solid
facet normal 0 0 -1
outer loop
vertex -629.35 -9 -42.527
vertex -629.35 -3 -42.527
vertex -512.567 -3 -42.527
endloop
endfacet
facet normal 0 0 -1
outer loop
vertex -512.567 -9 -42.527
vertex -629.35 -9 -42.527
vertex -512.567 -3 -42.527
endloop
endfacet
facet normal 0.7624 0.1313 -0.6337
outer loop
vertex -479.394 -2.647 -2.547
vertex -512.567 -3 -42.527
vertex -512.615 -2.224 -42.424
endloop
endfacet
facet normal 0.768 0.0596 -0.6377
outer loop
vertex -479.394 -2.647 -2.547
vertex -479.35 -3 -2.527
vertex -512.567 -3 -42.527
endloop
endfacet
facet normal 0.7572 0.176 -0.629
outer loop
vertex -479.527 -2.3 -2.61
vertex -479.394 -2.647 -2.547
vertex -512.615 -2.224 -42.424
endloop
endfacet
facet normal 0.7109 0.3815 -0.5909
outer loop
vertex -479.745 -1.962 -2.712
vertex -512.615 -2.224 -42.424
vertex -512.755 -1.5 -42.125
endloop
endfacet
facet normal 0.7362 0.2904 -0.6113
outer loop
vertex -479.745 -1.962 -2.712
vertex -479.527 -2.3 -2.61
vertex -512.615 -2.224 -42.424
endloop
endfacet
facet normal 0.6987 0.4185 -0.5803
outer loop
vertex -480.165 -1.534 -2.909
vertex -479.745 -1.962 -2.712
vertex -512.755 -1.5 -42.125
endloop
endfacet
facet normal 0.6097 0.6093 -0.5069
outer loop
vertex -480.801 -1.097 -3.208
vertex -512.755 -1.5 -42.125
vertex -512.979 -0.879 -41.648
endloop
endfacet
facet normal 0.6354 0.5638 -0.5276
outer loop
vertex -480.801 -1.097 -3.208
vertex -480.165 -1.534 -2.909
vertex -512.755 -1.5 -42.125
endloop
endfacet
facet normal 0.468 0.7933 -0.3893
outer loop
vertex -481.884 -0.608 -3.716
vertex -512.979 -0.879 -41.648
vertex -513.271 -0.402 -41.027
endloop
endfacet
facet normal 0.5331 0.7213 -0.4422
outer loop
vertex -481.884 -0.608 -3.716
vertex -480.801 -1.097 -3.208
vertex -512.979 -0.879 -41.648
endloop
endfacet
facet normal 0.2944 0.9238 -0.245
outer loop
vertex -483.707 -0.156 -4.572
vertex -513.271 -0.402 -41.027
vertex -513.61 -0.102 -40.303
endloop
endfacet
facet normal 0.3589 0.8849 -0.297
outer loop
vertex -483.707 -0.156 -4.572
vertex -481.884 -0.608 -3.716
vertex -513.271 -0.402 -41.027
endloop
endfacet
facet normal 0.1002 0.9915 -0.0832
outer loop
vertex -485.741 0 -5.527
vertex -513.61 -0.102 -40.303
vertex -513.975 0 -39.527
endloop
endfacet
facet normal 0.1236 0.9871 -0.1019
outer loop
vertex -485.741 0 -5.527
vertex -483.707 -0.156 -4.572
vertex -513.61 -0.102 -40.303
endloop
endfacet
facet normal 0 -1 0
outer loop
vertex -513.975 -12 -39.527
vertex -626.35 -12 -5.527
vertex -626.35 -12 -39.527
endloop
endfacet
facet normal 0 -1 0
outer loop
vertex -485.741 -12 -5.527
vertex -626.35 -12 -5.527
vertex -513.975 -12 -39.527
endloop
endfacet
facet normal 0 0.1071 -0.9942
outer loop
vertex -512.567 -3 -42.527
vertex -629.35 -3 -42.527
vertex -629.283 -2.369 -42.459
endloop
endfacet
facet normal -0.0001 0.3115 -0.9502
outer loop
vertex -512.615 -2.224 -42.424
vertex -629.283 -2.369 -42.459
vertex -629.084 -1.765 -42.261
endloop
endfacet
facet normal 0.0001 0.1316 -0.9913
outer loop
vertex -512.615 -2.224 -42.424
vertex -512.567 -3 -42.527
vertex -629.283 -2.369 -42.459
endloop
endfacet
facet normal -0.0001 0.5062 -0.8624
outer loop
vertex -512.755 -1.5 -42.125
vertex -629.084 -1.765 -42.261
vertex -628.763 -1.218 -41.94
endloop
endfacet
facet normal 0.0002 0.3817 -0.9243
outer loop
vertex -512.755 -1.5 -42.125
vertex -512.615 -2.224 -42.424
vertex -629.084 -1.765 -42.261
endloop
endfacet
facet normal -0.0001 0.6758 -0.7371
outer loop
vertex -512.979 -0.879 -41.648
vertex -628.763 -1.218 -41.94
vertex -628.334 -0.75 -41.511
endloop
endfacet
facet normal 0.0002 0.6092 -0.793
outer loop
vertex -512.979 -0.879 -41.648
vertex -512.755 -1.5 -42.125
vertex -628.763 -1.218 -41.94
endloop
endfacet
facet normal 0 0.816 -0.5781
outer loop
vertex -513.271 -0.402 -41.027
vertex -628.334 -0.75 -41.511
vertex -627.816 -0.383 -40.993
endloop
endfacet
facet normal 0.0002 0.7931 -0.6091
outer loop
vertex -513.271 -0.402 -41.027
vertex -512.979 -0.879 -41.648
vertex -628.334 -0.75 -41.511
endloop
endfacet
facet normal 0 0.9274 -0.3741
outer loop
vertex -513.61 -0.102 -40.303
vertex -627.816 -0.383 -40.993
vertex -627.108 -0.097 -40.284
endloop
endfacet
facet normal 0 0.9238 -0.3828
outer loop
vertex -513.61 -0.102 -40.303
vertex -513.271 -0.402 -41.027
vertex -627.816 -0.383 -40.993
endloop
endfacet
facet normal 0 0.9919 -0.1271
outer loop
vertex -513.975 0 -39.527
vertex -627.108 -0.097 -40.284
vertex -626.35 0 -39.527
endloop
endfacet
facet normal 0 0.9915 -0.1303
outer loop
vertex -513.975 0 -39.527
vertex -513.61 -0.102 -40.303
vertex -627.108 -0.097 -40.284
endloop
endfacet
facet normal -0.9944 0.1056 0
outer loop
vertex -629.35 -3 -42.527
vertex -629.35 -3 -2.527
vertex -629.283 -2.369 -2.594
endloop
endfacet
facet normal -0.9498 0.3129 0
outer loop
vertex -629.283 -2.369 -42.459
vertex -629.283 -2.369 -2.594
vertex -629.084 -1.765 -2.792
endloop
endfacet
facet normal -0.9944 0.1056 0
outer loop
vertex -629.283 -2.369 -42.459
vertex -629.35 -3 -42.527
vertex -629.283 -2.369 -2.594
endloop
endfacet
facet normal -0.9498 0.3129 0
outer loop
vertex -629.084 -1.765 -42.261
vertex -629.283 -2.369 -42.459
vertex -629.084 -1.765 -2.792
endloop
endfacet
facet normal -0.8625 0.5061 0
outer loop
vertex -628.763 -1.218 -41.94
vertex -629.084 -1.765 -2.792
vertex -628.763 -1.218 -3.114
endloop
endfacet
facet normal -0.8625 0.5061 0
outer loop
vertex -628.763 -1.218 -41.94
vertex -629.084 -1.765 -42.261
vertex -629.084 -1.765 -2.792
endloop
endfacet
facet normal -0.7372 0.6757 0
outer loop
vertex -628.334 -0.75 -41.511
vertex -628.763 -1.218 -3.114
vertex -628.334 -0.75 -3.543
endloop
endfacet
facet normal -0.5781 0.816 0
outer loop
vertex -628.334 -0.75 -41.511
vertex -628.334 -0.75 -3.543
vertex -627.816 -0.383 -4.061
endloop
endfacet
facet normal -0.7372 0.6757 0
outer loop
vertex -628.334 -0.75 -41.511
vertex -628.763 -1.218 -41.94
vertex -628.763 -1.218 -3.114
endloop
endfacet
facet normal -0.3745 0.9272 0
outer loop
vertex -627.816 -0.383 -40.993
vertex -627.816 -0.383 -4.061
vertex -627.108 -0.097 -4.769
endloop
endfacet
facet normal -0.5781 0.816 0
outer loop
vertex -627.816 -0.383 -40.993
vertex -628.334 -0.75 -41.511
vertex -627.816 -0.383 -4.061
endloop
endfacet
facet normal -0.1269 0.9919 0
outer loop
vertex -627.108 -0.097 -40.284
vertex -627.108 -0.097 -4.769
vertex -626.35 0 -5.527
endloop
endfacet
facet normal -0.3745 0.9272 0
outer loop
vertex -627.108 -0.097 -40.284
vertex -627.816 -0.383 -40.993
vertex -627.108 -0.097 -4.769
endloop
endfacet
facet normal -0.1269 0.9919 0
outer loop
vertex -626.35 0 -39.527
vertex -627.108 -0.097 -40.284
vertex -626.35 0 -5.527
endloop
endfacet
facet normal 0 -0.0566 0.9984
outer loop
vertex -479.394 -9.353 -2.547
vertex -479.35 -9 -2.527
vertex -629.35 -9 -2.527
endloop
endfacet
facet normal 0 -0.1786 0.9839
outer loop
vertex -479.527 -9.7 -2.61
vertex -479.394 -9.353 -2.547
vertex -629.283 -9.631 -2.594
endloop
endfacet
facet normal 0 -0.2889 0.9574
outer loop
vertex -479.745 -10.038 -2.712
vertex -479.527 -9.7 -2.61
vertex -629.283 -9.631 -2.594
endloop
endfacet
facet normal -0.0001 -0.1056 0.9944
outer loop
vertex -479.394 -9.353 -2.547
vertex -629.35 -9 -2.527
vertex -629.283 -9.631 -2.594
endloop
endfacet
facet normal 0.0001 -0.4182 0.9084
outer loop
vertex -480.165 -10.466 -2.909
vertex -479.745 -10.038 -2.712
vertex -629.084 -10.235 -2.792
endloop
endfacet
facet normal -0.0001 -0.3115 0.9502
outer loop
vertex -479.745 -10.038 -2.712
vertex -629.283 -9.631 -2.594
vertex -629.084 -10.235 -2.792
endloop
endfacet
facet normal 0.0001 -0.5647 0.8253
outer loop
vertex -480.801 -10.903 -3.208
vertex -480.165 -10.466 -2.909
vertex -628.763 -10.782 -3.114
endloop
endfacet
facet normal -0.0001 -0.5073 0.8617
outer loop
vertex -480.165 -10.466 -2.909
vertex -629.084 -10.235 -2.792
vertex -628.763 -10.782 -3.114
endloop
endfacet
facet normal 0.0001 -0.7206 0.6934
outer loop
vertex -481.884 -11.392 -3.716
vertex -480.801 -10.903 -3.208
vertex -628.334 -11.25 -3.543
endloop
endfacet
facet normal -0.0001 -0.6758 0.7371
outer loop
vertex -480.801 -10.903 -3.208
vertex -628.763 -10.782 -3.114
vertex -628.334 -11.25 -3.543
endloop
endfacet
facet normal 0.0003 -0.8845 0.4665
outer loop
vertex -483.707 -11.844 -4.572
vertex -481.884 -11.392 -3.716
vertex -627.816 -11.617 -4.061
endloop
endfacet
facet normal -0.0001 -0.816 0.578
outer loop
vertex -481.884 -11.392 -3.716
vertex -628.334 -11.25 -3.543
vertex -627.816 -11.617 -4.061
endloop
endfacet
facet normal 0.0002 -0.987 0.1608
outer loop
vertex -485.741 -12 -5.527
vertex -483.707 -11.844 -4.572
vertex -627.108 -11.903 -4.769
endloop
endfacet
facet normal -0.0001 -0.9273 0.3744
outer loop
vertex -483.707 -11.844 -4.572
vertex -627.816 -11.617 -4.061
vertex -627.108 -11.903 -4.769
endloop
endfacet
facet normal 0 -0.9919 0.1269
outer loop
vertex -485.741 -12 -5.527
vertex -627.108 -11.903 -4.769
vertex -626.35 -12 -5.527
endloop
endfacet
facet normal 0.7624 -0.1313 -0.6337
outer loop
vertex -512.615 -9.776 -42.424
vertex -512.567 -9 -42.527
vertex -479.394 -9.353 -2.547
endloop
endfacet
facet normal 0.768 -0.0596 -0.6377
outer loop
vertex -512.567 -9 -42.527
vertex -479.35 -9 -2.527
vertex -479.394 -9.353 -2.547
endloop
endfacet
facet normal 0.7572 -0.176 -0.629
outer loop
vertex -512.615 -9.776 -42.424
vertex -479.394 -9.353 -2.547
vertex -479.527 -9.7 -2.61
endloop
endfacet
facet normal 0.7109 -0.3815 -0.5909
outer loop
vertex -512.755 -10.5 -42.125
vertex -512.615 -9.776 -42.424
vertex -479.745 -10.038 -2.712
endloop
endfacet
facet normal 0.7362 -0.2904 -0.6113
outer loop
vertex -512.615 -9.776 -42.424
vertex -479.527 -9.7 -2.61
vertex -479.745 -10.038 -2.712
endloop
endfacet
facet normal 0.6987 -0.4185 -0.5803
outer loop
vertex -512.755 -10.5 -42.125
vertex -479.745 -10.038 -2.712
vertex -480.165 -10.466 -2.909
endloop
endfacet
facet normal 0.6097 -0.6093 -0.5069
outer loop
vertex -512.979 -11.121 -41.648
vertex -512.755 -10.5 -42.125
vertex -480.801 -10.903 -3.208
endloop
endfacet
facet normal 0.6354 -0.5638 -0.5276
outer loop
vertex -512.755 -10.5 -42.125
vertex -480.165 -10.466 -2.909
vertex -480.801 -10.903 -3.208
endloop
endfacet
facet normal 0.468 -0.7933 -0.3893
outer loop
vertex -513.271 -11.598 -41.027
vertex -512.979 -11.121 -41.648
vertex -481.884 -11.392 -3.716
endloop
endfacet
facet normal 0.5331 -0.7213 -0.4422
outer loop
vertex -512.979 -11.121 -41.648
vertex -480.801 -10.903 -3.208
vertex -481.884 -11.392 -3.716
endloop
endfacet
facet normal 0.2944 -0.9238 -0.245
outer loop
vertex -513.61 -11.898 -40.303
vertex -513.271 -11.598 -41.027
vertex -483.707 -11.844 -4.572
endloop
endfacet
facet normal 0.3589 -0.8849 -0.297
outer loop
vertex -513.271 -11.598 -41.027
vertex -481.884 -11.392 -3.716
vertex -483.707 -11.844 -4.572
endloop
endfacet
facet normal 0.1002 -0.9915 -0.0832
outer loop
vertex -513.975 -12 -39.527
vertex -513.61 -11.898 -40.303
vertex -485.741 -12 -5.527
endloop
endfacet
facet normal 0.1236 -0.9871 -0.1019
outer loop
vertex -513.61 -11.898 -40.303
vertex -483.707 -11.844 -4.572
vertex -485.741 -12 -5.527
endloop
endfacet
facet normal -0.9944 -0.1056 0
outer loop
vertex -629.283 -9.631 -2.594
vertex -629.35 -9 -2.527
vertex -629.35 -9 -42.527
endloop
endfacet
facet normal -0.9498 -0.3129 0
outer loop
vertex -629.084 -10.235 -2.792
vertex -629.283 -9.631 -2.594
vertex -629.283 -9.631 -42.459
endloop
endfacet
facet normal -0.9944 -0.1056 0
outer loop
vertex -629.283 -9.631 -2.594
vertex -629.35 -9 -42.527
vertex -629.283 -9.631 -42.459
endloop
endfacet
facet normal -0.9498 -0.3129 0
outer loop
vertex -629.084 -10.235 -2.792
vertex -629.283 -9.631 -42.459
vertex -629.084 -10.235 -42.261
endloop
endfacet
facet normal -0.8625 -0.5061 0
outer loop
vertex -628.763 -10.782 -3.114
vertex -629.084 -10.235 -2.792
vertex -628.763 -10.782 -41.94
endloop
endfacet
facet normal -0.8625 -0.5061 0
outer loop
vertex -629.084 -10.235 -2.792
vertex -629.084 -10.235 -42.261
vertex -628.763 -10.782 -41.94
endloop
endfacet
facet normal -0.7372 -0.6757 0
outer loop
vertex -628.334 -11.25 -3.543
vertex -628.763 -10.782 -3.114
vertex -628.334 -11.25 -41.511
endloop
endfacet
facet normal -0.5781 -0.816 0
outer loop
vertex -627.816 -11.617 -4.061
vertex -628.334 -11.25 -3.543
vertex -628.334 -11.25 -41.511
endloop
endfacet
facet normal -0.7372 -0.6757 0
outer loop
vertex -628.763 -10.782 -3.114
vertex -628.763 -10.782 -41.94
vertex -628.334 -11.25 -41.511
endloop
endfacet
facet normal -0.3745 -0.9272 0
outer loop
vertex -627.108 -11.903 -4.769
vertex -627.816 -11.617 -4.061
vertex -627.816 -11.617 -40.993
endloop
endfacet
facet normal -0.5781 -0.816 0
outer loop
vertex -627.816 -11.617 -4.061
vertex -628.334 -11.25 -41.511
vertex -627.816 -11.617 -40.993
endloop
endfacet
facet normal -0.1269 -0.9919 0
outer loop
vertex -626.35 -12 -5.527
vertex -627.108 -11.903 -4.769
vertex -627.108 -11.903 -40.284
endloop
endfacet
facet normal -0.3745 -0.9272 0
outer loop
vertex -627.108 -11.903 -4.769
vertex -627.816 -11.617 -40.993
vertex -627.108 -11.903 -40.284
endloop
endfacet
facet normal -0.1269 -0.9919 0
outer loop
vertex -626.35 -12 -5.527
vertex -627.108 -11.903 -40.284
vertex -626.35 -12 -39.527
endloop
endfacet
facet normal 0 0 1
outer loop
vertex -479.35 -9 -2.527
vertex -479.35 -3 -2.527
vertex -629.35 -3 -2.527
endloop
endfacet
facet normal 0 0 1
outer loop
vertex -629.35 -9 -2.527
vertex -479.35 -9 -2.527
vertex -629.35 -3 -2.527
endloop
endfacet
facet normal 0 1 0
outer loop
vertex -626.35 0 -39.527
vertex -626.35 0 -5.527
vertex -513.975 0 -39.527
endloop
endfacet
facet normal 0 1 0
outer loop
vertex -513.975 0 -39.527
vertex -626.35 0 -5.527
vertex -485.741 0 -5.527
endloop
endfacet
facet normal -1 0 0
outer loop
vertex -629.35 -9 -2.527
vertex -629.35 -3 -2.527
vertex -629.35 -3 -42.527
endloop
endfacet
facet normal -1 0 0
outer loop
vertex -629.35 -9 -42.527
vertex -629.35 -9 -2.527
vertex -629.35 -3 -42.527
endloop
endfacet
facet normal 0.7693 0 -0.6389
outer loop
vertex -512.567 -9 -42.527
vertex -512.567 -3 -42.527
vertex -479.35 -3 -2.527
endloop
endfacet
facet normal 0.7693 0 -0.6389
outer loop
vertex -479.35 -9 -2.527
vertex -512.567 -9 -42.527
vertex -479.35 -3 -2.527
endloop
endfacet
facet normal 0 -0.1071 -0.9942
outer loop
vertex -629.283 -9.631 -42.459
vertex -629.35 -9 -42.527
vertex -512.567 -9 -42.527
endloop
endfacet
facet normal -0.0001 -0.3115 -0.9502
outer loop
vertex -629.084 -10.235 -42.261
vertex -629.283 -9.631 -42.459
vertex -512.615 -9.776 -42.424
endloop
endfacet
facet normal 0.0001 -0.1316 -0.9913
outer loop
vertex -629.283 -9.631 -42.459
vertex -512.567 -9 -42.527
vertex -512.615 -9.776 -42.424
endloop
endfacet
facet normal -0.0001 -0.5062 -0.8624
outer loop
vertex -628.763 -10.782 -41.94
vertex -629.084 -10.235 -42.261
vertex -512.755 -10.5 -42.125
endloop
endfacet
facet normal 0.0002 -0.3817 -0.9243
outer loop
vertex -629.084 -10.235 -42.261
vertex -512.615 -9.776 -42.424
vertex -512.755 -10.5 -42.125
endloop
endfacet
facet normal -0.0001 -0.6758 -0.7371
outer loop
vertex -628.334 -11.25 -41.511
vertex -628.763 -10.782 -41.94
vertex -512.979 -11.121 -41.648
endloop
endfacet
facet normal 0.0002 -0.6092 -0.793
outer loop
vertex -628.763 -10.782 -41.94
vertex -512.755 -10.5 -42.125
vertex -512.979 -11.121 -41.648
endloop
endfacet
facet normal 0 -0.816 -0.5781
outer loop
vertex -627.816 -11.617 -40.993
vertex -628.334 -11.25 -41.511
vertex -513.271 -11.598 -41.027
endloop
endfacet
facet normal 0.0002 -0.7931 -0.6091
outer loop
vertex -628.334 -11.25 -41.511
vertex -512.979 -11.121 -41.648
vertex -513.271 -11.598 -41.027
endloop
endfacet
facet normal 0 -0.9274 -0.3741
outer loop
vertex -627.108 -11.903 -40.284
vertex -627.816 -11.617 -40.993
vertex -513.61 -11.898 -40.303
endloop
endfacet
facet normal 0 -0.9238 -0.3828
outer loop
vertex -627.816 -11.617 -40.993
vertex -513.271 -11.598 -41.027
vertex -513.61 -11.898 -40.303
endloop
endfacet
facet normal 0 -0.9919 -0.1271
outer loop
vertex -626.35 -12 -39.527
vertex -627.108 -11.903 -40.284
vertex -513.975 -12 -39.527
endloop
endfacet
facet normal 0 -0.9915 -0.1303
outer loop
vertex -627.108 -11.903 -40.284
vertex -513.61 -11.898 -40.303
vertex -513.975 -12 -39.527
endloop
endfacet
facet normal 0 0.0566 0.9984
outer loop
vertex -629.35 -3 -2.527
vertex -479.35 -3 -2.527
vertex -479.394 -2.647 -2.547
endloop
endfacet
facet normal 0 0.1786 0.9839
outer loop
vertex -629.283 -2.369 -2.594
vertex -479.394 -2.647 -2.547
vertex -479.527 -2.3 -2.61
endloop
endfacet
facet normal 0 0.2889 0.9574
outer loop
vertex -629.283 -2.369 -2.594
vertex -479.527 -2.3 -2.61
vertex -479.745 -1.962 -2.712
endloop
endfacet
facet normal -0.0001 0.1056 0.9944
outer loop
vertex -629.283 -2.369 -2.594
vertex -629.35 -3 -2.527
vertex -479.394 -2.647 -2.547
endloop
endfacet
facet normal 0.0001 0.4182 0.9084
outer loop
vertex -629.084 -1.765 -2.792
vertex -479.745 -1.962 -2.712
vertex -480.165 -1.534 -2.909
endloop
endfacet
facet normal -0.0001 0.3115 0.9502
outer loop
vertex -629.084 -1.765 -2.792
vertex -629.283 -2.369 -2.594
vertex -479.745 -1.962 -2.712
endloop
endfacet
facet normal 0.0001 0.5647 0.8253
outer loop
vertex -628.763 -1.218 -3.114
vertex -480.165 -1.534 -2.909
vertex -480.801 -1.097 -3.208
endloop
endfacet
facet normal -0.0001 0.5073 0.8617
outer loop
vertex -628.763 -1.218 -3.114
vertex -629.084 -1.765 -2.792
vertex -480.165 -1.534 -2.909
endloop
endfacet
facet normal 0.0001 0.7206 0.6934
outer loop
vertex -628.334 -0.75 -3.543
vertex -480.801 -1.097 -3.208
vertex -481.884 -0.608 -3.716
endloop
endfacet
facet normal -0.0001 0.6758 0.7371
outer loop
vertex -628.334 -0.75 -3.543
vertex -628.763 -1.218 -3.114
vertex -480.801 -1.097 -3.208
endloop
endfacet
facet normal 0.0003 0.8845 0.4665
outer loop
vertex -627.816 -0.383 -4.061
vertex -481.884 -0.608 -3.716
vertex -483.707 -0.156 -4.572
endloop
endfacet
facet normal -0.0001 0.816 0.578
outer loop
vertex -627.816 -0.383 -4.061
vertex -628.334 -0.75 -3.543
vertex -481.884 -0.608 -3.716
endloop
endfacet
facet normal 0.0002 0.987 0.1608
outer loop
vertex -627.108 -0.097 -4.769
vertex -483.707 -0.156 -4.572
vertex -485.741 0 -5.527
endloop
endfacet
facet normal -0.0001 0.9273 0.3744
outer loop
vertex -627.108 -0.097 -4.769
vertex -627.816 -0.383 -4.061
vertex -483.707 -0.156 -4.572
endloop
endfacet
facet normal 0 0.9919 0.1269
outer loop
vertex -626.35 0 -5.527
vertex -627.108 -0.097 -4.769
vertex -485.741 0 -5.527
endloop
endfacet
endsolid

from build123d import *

# Parameters (mm, degrees)
F1_DEPTH = 12
F3_R     = 3


with BuildPart() as f1:
    # F0 (on Front) → F1 (new body)
    with BuildSketch(Plane.XZ):
        Polygon((-479.350195, -2.526657), (-629.350195, -2.526657), (-629.350195, -42.526657), (-512.566566, -42.526657), align=None)
    extrude(amount=F1_DEPTH)

    # F3
    f3_edges = [f1.edges().sort_by_distance(p)[0] for p in [
        (-554.350195, -12, -2.526657),
        (-629.350195, -12, -22.526657),
        (-570.958381, -12, -42.526657),
        (-495.958381, -12, -22.526657),
        (-554.350195, 0, -2.526657),
        (-629.350195, 0, -22.526657),
        (-570.958381, 0, -42.526657),
        (-495.958381, 0, -22.526657),
    ]]
    fillet(f3_edges, radius=F3_R)


solid = f1.part
